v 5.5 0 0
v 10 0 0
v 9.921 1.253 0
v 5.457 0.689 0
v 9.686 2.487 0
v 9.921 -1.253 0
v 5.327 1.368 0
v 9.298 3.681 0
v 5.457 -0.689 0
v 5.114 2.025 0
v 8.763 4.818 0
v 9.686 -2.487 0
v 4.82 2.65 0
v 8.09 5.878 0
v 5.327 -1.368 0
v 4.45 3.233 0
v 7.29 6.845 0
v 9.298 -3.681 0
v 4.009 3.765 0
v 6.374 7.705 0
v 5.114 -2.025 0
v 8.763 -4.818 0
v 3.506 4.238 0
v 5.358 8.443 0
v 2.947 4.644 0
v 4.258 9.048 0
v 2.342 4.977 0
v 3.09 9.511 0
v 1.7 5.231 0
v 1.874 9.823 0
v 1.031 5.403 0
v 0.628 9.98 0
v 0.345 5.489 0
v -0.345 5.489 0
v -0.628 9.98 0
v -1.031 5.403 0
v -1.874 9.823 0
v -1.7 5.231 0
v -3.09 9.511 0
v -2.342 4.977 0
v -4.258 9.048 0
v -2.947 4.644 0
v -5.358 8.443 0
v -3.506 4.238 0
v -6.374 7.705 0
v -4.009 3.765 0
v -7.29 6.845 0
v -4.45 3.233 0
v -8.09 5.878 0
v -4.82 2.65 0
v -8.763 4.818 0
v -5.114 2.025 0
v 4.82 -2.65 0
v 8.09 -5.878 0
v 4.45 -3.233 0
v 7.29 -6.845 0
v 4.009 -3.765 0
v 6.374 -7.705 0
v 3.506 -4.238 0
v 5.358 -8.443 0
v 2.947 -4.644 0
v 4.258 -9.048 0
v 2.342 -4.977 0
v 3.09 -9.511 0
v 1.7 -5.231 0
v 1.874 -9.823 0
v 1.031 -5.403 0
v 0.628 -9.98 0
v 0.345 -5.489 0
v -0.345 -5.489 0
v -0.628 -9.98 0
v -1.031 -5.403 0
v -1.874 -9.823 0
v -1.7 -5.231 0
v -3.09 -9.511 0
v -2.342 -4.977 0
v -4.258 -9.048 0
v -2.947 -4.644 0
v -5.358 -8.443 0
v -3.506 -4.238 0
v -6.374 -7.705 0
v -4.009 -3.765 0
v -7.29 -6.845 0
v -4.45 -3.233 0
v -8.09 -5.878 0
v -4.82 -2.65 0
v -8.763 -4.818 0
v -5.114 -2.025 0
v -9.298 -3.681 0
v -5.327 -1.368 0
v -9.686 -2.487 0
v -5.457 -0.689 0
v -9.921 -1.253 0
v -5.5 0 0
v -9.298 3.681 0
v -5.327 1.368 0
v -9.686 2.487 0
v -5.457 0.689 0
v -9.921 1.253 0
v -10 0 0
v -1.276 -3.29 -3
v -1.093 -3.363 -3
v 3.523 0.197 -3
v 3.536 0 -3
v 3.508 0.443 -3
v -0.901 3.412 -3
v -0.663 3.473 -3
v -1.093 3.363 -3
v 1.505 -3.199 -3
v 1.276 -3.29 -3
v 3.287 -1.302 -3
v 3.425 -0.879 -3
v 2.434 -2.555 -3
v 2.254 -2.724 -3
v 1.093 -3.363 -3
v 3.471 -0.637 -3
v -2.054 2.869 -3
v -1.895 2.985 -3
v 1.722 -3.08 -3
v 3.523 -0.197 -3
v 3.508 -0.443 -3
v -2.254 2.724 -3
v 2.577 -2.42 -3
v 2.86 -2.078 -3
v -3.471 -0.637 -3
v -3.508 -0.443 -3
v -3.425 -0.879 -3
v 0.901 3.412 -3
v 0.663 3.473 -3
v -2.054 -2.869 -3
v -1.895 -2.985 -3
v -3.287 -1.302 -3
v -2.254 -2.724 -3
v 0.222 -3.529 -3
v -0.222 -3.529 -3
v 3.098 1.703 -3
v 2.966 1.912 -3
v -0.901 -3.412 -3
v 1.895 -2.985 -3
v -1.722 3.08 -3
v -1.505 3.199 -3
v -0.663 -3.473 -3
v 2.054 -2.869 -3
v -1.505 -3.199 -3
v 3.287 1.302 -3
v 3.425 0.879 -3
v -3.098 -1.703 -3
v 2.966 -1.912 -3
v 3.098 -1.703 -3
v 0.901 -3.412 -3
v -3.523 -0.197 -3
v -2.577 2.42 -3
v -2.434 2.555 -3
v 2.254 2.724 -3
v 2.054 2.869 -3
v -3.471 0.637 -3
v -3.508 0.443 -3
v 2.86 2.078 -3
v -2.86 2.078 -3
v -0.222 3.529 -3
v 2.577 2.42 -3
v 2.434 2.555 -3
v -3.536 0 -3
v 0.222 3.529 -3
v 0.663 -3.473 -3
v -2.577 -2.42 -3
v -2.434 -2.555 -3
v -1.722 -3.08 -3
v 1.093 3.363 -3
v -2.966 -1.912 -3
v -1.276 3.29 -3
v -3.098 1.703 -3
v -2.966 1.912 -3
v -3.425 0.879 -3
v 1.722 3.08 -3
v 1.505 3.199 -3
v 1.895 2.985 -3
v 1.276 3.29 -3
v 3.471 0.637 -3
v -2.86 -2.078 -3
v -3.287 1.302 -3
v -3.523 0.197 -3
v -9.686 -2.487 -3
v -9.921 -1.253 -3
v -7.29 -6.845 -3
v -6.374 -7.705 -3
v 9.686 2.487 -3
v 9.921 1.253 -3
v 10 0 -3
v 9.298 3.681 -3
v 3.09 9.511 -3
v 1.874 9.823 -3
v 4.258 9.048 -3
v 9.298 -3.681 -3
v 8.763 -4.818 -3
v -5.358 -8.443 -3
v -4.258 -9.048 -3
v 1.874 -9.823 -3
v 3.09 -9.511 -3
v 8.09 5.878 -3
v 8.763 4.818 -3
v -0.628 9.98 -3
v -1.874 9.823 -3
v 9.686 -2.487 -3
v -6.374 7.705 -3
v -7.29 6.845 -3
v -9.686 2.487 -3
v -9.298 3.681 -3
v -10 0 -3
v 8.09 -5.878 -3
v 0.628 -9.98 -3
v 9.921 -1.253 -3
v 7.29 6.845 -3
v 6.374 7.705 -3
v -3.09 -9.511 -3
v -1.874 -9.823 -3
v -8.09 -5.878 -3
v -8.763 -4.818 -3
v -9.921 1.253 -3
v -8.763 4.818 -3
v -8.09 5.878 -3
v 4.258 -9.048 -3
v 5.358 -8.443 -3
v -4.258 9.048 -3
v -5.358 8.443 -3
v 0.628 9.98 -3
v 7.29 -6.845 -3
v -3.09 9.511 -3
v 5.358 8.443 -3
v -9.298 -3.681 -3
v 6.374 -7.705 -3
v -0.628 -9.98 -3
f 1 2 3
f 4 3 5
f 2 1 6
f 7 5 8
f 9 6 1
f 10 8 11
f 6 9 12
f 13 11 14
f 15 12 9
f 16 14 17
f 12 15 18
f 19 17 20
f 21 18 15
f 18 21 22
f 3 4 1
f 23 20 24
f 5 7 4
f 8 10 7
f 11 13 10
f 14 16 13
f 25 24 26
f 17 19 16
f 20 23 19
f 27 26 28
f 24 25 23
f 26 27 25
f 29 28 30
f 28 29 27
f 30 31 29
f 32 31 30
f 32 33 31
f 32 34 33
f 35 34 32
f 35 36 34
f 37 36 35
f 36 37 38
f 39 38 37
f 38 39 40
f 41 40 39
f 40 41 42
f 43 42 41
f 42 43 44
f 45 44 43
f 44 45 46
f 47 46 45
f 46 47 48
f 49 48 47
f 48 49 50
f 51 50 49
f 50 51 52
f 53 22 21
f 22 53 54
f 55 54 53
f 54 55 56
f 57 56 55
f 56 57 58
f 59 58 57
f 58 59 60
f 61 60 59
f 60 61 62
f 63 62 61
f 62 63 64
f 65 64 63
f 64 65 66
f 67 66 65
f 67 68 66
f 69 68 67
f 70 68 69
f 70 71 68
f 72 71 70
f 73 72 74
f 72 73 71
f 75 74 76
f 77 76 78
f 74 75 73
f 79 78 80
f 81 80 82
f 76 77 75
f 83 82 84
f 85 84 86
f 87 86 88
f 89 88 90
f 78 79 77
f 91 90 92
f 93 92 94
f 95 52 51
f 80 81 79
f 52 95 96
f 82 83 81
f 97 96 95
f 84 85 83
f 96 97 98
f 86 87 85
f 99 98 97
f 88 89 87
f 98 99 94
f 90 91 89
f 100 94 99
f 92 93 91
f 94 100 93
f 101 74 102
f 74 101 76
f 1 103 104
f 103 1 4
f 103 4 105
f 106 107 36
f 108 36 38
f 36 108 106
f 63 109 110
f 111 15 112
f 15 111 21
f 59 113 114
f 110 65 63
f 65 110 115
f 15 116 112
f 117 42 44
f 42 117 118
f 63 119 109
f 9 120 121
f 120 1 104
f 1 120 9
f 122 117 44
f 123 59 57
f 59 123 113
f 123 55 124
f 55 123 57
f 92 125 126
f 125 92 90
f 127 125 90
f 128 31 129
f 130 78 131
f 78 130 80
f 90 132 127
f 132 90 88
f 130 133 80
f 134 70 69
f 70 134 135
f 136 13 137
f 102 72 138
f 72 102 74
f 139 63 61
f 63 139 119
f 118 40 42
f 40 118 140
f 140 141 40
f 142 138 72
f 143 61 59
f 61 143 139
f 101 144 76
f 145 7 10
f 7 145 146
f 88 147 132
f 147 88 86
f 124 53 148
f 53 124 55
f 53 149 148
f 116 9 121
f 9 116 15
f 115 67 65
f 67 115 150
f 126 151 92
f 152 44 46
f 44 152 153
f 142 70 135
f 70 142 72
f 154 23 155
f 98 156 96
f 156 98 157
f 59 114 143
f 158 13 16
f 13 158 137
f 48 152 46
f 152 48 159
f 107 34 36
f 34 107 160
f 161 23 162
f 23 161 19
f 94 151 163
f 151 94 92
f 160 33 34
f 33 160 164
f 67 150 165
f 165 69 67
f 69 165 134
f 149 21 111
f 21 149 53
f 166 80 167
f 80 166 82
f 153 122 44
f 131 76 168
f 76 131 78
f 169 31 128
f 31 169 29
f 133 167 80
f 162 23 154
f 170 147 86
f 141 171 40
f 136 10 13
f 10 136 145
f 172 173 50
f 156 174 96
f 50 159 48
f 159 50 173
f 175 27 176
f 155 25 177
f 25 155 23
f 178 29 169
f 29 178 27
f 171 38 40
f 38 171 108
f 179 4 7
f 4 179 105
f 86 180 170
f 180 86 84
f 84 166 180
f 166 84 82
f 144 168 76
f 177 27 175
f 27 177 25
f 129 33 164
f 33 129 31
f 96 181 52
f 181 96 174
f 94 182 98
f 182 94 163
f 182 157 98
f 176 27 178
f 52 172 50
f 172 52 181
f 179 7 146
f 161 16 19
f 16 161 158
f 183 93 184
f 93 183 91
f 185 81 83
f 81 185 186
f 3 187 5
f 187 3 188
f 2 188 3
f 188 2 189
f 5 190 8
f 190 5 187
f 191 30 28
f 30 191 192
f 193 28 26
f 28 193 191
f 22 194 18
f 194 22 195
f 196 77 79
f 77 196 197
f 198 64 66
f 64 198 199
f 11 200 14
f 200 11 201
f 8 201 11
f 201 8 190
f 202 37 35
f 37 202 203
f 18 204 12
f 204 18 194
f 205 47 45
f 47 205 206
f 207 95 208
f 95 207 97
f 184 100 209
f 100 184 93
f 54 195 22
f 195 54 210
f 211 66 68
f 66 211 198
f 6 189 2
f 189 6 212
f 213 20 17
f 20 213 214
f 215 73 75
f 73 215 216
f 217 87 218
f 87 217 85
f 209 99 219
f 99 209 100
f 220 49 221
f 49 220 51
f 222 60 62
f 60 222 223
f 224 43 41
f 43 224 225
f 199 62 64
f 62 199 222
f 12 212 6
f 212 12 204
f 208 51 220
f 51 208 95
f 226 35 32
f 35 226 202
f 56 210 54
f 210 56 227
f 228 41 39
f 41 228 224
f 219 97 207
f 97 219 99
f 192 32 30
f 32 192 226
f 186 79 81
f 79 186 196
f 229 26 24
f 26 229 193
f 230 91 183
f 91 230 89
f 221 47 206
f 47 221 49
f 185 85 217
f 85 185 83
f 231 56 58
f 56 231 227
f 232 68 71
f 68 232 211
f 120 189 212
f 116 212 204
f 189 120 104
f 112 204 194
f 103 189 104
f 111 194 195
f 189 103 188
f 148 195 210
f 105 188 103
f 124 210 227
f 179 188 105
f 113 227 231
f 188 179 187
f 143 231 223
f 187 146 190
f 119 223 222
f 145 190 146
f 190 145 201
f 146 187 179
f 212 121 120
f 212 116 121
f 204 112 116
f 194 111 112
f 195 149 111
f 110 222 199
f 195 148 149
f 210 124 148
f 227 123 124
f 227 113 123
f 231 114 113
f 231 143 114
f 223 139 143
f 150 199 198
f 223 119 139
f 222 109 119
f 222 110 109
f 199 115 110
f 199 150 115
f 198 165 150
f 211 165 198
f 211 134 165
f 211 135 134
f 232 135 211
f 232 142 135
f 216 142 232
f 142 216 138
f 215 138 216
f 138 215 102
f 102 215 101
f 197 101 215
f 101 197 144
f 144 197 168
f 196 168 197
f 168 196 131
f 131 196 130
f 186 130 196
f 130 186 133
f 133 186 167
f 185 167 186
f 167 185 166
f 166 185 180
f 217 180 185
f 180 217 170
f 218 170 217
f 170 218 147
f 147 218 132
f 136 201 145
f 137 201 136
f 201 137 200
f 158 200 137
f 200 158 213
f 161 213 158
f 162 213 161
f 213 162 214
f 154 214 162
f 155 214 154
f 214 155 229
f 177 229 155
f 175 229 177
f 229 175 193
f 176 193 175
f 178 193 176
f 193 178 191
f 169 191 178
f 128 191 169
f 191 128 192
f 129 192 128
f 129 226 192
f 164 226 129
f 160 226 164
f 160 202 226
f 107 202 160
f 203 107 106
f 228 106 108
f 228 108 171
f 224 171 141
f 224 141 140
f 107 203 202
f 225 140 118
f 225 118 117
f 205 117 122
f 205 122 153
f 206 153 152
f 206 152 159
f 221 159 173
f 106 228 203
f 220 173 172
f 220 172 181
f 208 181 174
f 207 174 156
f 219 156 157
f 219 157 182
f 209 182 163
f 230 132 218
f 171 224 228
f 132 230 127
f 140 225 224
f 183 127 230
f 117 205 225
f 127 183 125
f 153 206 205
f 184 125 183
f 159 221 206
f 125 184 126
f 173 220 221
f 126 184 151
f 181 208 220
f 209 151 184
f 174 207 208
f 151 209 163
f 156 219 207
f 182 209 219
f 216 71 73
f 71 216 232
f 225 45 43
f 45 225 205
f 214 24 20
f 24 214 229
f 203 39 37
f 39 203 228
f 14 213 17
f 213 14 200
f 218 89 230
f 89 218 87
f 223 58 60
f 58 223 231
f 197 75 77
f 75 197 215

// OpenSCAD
$fn = 50;


difference() {
	union() {
		translate(v = [0, 0, -3.0000000000]) {
			cylinder(h = 3, r = 10.0000000000);
		}
		cylinder(h = 0, r = 20.0000000000);
	}
	union() {
		translate(v = [0, 0, 0]) {
			rotate(a = [0, 0, 0]) {
				difference() {
					union() {
						#translate(v = [0, 0, -3.0000000000]) {
							cylinder(h = 3, r = 2.2500000000);
						}
						#translate(v = [0, 0, -4.2000000000]) {
							cylinder(h = 4.2000000000, r1 = 2.7500000000, r2 = 5.5000000000);
						}
						#translate(v = [0, 0, -3.0000000000]) {
							cylinder(h = 3, r = 2.7500000000);
						}
						#translate(v = [0, 0, -3.0000000000]) {
							cylinder(h = 3, r = 2.2500000000);
						}
					}
					union();
				}
			}
		}
	}
}
